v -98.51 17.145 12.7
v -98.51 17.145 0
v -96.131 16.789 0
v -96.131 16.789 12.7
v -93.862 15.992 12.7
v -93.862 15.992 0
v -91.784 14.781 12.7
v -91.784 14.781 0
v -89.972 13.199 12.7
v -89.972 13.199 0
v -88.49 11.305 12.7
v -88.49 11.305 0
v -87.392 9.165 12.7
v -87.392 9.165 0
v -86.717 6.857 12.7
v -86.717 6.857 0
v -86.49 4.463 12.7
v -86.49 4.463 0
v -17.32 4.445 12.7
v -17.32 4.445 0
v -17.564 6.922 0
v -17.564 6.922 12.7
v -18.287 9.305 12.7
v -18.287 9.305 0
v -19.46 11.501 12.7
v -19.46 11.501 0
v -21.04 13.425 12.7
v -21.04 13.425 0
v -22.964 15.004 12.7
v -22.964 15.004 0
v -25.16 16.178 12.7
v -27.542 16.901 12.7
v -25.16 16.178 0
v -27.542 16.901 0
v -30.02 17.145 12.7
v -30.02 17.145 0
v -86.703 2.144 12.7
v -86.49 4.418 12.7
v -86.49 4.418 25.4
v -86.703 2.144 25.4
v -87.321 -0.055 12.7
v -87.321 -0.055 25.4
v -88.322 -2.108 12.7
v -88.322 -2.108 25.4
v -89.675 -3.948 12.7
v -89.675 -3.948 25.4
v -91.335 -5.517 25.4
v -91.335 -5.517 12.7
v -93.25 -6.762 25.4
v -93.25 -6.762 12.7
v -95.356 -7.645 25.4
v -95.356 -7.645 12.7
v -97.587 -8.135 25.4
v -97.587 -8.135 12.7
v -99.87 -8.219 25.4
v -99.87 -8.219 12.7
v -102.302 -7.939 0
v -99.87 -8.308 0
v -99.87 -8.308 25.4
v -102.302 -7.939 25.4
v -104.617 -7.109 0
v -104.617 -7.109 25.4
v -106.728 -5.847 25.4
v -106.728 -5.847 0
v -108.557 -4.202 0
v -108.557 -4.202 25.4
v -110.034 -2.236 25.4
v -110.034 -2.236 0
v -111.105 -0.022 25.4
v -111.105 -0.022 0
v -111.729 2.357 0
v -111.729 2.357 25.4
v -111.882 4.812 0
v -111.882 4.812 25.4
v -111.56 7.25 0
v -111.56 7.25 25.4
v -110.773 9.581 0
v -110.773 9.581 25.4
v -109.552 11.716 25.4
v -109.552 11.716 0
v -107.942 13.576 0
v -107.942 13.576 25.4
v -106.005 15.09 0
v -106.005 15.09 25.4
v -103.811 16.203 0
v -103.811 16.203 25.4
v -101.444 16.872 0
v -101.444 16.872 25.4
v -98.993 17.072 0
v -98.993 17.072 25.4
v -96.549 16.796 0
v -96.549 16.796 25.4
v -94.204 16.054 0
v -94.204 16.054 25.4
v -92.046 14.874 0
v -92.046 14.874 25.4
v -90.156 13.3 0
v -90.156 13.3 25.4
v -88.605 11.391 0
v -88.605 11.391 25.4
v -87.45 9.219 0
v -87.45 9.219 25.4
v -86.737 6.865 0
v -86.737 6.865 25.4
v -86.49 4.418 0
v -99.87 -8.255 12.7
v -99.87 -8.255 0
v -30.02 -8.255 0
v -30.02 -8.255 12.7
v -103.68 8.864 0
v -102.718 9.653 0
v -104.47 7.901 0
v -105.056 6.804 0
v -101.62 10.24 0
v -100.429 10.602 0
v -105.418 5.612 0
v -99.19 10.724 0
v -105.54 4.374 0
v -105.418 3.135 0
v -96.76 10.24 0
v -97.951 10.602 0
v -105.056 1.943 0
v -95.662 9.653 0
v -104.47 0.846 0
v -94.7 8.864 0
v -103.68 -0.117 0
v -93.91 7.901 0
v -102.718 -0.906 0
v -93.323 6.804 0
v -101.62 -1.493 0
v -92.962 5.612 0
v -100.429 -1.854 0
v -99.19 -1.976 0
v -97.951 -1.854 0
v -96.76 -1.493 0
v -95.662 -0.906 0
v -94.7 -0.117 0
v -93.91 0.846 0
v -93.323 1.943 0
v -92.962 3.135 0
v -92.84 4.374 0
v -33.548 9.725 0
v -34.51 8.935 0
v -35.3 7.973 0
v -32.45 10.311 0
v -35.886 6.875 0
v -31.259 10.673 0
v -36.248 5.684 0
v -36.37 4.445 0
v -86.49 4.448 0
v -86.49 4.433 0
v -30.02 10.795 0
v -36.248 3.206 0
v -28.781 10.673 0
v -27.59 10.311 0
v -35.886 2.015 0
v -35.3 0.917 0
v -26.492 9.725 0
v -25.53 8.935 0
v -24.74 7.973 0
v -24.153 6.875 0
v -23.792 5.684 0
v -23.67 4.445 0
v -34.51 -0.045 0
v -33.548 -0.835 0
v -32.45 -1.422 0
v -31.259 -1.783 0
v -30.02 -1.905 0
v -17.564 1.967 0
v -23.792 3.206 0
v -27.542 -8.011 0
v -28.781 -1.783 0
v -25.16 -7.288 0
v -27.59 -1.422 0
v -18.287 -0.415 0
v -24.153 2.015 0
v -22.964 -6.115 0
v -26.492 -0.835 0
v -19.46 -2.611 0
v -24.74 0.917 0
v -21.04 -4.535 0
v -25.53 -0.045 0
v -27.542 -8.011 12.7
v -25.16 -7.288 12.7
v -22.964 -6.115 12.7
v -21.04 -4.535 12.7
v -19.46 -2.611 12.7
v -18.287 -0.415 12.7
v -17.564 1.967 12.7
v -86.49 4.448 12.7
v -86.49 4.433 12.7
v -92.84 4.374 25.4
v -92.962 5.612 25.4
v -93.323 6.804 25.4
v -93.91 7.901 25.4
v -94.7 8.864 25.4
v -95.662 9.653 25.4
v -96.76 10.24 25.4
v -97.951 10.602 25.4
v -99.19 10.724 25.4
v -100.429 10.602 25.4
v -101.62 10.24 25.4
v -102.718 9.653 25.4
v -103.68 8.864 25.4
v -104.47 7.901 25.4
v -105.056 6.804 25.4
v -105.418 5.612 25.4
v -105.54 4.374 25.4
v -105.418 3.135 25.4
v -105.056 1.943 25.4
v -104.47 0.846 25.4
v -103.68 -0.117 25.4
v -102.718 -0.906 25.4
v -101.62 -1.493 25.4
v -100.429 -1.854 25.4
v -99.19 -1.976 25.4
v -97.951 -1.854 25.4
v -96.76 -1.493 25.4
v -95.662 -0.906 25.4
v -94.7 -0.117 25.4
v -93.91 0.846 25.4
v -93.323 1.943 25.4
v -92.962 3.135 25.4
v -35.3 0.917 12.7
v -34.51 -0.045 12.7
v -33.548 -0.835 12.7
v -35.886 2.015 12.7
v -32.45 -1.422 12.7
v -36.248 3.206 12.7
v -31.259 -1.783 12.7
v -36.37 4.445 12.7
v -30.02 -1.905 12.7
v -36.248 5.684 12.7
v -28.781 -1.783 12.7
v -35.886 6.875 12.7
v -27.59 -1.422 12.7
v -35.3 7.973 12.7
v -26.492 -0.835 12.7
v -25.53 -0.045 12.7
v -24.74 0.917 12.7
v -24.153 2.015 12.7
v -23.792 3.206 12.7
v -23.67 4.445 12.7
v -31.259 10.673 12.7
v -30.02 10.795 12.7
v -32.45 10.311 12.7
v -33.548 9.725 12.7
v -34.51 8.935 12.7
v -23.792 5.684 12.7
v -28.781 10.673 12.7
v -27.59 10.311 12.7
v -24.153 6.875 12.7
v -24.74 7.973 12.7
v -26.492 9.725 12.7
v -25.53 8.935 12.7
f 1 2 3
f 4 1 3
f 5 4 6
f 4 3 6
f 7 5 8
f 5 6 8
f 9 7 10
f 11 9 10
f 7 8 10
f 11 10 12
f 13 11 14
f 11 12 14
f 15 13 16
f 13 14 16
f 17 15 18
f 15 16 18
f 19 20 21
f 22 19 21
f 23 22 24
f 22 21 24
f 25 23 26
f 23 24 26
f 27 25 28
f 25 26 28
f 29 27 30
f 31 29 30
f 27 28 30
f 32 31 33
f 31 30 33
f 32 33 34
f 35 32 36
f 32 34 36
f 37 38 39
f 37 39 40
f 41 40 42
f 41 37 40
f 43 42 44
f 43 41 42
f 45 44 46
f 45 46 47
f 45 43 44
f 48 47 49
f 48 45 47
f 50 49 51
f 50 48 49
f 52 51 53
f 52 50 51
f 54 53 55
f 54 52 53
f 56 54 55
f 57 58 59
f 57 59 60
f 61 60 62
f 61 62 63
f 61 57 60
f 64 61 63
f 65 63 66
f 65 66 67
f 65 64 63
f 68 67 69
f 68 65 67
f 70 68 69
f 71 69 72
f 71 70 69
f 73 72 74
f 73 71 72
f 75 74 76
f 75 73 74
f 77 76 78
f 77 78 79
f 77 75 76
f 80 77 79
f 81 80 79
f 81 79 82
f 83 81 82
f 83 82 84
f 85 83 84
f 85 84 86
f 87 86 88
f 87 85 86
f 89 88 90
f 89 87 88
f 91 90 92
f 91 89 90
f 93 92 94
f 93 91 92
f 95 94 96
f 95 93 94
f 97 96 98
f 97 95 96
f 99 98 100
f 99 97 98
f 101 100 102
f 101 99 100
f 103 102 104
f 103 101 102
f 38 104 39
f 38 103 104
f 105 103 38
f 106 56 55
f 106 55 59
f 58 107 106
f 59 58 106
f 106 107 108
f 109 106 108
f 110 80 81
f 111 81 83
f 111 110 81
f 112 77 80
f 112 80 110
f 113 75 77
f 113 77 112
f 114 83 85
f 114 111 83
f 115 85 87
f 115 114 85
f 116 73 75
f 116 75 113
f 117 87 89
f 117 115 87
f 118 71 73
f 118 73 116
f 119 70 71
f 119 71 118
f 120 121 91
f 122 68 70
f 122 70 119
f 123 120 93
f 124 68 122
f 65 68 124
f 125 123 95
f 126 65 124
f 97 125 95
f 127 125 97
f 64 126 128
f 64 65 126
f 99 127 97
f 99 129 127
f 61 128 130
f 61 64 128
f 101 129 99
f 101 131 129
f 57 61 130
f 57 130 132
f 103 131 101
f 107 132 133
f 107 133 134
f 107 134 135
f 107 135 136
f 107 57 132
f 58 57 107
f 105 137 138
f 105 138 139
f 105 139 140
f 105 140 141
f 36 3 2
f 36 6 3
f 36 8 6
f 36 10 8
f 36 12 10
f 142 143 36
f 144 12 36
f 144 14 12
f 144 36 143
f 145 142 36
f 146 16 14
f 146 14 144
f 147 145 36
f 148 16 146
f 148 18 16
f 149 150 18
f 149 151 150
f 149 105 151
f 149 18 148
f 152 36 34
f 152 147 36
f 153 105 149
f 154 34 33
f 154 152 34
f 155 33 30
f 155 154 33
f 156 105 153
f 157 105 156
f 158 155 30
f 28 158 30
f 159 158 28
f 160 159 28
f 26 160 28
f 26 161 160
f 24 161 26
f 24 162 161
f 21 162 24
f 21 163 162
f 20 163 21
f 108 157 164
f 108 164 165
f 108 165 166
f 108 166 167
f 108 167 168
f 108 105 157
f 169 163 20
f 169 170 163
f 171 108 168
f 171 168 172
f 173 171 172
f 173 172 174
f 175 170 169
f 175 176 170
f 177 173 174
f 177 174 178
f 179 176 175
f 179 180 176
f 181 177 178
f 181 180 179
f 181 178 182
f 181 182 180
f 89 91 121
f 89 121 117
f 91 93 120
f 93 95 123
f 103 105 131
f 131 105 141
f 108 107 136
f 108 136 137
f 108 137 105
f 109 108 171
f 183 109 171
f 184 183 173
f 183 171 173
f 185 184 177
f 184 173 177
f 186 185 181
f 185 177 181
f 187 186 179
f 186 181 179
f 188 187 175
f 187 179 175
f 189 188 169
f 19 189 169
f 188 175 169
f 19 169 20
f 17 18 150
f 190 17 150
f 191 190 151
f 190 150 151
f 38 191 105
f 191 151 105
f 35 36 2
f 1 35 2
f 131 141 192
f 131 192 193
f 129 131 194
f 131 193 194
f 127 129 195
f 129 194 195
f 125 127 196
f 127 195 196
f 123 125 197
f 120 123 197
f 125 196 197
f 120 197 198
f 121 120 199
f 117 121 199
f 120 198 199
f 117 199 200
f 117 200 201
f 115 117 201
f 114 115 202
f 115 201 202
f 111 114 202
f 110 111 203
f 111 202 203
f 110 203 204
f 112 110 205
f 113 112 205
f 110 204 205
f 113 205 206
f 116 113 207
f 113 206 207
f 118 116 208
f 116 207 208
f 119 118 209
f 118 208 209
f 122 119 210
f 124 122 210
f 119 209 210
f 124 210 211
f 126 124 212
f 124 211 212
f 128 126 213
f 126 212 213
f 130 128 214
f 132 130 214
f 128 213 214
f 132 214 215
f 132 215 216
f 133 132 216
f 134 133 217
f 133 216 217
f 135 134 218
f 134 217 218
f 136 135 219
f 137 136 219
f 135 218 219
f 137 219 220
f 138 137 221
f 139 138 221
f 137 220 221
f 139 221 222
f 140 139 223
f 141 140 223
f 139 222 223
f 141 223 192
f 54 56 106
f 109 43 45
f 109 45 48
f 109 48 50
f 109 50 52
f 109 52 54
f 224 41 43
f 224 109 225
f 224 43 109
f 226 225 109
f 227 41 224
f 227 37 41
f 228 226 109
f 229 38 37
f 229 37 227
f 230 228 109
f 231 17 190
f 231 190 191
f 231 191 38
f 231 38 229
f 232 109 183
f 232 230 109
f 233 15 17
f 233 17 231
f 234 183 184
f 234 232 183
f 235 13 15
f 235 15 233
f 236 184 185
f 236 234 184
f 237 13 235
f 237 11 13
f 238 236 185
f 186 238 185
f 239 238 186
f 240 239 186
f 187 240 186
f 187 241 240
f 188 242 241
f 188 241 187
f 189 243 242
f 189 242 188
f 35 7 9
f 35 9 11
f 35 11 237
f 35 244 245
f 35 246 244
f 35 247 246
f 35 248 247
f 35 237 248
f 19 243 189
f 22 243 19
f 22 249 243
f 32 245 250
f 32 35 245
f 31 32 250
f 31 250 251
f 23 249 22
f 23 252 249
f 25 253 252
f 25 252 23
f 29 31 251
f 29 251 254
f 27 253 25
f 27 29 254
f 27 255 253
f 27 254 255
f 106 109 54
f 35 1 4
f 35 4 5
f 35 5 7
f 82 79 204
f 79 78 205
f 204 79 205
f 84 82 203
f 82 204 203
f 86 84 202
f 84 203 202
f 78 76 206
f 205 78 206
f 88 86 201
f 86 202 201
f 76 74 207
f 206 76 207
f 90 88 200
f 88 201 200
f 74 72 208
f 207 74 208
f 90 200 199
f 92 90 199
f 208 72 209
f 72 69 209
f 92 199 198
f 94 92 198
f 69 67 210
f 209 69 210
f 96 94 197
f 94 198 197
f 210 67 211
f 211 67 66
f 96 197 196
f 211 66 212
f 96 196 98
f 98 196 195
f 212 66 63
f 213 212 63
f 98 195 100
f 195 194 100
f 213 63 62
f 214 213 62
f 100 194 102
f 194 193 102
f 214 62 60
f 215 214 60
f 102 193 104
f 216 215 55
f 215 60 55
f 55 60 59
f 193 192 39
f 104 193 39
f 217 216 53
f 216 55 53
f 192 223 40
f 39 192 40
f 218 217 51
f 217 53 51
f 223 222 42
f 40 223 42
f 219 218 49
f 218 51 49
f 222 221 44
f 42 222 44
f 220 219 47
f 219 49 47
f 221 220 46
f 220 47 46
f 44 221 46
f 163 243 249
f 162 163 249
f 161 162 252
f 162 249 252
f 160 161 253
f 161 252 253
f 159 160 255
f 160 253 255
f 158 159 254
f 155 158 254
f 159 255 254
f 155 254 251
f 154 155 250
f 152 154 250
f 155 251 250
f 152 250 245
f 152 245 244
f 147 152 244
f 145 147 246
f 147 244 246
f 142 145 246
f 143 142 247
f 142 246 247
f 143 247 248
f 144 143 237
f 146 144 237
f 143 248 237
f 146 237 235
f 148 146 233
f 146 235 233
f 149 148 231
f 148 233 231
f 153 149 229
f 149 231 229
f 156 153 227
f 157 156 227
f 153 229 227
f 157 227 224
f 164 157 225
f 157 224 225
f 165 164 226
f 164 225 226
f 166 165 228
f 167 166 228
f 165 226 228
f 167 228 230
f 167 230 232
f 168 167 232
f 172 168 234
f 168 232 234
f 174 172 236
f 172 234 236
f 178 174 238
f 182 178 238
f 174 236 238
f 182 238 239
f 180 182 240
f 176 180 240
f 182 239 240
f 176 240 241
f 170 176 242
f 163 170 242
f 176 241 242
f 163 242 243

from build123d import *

# Parameters (mm, degrees)
F1_DEPTH = 12.7
F3_DEPTH = 25.4
F4_R     = 6.35
F5_DEPTH = 25.4
F6_R     = 6.35
F7_DEPTH = 12.7


with BuildPart() as f1:
    # F0 (on Top) → F1 (new body)
    with BuildSketch(Plane.XY):
        with BuildLine():
            ThreePointArc((-98.5095974419, 17.1447865009), (-89.9721430512, 13.1994974474), (-86.4897244217, 4.4630111011))
            ThreePointArc((-86.4897244217, 4.4630111011), (-90.4532380754, -4.7545702694), (-99.8698514014, -8.2187642987))
            Line((-99.8698514014, -8.2187642987), (-99.8698514014, -8.2552134991))
            Line((-99.8698514014, -8.2552134991), (-30.0198514014, -8.2552134991))
            ThreePointArc((-30.0198514014, -8.2552134991), (-42.7198514014, 4.4447865009), (-30.0198514014, 17.1447865009))
            Line((-30.0198514014, 17.1447865009), (-98.5095974419, 17.1447865009))
        make_face()
        with BuildLine():
            ThreePointArc((-17.3198514014, 4.4447865009), (-21.0395952804, 13.425042622), (-30.0198514014, 17.1447865009))
            Line((-30.0198514014, 17.1447865009), (-30.0198514014, -8.2552134991))
            ThreePointArc((-30.0198514014, -8.2552134991), (-21.0395952804, -4.5354696201), (-17.3198514014, 4.4447865009))
        make_face()
        with BuildLine():
            Line((-30.0198514014, -8.2552134991), (-30.0198514014, 17.1447865009))
            ThreePointArc((-30.0198514014, 17.1447865009), (-42.7198514014, 4.4447865009), (-30.0198514014, -8.2552134991))
        make_face()
    extrude(amount=F1_DEPTH)

    # F2 (on face) → F3 (join)
    with BuildSketch(Plane(origin=(0, 0, 0), x_dir=(1, 0, 0), z_dir=(0, 0, -1))):
        with BuildLine():
            ThreePointArc((-99.8698514014, -17.0553149368), (-90.4694861278, -13.6064937824), (-86.4898032129, -4.418275319))
            ThreePointArc((-86.4898032129, -4.418275319), (-90.4694861278, 4.7699431443), (-99.8698514014, 8.2187642987))
            Line((-99.8698514014, 8.2187642987), (-99.8698514014, -17.0553149368))
        make_face()
        with BuildLine():
            Line((-99.8698514014, 8.2187642987), (-99.8698514014, 8.2552134991))
            Line((-99.8698514014, 8.2552134991), (-99.8698514014, 8.3082358629))
            ThreePointArc((-99.8698514014, 8.3082358629), (-111.8897244217, -4.373539537), (-99.8698514014, -17.0553149368))
            Line((-99.8698514014, -17.0553149368), (-99.8698514014, 8.2187642987))
        make_face()
    extrude(amount=-F3_DEPTH)

    # F4 (on face) → F5 (cut)
    with BuildSketch(Plane.XY.offset(25.4)):
        with Locations((-99.1897244217, 4.373539537)):
            Circle(F4_R)
    extrude(amount=-F5_DEPTH, mode=Mode.SUBTRACT)

    # F6 (on face) → F7 (cut)
    with BuildSketch(Plane.XY.offset(12.7)):
        with Locations((-30.0198514014, 4.4447865009)):
            Circle(F6_R)
    extrude(amount=-F7_DEPTH, mode=Mode.SUBTRACT)


solid = f1.part
